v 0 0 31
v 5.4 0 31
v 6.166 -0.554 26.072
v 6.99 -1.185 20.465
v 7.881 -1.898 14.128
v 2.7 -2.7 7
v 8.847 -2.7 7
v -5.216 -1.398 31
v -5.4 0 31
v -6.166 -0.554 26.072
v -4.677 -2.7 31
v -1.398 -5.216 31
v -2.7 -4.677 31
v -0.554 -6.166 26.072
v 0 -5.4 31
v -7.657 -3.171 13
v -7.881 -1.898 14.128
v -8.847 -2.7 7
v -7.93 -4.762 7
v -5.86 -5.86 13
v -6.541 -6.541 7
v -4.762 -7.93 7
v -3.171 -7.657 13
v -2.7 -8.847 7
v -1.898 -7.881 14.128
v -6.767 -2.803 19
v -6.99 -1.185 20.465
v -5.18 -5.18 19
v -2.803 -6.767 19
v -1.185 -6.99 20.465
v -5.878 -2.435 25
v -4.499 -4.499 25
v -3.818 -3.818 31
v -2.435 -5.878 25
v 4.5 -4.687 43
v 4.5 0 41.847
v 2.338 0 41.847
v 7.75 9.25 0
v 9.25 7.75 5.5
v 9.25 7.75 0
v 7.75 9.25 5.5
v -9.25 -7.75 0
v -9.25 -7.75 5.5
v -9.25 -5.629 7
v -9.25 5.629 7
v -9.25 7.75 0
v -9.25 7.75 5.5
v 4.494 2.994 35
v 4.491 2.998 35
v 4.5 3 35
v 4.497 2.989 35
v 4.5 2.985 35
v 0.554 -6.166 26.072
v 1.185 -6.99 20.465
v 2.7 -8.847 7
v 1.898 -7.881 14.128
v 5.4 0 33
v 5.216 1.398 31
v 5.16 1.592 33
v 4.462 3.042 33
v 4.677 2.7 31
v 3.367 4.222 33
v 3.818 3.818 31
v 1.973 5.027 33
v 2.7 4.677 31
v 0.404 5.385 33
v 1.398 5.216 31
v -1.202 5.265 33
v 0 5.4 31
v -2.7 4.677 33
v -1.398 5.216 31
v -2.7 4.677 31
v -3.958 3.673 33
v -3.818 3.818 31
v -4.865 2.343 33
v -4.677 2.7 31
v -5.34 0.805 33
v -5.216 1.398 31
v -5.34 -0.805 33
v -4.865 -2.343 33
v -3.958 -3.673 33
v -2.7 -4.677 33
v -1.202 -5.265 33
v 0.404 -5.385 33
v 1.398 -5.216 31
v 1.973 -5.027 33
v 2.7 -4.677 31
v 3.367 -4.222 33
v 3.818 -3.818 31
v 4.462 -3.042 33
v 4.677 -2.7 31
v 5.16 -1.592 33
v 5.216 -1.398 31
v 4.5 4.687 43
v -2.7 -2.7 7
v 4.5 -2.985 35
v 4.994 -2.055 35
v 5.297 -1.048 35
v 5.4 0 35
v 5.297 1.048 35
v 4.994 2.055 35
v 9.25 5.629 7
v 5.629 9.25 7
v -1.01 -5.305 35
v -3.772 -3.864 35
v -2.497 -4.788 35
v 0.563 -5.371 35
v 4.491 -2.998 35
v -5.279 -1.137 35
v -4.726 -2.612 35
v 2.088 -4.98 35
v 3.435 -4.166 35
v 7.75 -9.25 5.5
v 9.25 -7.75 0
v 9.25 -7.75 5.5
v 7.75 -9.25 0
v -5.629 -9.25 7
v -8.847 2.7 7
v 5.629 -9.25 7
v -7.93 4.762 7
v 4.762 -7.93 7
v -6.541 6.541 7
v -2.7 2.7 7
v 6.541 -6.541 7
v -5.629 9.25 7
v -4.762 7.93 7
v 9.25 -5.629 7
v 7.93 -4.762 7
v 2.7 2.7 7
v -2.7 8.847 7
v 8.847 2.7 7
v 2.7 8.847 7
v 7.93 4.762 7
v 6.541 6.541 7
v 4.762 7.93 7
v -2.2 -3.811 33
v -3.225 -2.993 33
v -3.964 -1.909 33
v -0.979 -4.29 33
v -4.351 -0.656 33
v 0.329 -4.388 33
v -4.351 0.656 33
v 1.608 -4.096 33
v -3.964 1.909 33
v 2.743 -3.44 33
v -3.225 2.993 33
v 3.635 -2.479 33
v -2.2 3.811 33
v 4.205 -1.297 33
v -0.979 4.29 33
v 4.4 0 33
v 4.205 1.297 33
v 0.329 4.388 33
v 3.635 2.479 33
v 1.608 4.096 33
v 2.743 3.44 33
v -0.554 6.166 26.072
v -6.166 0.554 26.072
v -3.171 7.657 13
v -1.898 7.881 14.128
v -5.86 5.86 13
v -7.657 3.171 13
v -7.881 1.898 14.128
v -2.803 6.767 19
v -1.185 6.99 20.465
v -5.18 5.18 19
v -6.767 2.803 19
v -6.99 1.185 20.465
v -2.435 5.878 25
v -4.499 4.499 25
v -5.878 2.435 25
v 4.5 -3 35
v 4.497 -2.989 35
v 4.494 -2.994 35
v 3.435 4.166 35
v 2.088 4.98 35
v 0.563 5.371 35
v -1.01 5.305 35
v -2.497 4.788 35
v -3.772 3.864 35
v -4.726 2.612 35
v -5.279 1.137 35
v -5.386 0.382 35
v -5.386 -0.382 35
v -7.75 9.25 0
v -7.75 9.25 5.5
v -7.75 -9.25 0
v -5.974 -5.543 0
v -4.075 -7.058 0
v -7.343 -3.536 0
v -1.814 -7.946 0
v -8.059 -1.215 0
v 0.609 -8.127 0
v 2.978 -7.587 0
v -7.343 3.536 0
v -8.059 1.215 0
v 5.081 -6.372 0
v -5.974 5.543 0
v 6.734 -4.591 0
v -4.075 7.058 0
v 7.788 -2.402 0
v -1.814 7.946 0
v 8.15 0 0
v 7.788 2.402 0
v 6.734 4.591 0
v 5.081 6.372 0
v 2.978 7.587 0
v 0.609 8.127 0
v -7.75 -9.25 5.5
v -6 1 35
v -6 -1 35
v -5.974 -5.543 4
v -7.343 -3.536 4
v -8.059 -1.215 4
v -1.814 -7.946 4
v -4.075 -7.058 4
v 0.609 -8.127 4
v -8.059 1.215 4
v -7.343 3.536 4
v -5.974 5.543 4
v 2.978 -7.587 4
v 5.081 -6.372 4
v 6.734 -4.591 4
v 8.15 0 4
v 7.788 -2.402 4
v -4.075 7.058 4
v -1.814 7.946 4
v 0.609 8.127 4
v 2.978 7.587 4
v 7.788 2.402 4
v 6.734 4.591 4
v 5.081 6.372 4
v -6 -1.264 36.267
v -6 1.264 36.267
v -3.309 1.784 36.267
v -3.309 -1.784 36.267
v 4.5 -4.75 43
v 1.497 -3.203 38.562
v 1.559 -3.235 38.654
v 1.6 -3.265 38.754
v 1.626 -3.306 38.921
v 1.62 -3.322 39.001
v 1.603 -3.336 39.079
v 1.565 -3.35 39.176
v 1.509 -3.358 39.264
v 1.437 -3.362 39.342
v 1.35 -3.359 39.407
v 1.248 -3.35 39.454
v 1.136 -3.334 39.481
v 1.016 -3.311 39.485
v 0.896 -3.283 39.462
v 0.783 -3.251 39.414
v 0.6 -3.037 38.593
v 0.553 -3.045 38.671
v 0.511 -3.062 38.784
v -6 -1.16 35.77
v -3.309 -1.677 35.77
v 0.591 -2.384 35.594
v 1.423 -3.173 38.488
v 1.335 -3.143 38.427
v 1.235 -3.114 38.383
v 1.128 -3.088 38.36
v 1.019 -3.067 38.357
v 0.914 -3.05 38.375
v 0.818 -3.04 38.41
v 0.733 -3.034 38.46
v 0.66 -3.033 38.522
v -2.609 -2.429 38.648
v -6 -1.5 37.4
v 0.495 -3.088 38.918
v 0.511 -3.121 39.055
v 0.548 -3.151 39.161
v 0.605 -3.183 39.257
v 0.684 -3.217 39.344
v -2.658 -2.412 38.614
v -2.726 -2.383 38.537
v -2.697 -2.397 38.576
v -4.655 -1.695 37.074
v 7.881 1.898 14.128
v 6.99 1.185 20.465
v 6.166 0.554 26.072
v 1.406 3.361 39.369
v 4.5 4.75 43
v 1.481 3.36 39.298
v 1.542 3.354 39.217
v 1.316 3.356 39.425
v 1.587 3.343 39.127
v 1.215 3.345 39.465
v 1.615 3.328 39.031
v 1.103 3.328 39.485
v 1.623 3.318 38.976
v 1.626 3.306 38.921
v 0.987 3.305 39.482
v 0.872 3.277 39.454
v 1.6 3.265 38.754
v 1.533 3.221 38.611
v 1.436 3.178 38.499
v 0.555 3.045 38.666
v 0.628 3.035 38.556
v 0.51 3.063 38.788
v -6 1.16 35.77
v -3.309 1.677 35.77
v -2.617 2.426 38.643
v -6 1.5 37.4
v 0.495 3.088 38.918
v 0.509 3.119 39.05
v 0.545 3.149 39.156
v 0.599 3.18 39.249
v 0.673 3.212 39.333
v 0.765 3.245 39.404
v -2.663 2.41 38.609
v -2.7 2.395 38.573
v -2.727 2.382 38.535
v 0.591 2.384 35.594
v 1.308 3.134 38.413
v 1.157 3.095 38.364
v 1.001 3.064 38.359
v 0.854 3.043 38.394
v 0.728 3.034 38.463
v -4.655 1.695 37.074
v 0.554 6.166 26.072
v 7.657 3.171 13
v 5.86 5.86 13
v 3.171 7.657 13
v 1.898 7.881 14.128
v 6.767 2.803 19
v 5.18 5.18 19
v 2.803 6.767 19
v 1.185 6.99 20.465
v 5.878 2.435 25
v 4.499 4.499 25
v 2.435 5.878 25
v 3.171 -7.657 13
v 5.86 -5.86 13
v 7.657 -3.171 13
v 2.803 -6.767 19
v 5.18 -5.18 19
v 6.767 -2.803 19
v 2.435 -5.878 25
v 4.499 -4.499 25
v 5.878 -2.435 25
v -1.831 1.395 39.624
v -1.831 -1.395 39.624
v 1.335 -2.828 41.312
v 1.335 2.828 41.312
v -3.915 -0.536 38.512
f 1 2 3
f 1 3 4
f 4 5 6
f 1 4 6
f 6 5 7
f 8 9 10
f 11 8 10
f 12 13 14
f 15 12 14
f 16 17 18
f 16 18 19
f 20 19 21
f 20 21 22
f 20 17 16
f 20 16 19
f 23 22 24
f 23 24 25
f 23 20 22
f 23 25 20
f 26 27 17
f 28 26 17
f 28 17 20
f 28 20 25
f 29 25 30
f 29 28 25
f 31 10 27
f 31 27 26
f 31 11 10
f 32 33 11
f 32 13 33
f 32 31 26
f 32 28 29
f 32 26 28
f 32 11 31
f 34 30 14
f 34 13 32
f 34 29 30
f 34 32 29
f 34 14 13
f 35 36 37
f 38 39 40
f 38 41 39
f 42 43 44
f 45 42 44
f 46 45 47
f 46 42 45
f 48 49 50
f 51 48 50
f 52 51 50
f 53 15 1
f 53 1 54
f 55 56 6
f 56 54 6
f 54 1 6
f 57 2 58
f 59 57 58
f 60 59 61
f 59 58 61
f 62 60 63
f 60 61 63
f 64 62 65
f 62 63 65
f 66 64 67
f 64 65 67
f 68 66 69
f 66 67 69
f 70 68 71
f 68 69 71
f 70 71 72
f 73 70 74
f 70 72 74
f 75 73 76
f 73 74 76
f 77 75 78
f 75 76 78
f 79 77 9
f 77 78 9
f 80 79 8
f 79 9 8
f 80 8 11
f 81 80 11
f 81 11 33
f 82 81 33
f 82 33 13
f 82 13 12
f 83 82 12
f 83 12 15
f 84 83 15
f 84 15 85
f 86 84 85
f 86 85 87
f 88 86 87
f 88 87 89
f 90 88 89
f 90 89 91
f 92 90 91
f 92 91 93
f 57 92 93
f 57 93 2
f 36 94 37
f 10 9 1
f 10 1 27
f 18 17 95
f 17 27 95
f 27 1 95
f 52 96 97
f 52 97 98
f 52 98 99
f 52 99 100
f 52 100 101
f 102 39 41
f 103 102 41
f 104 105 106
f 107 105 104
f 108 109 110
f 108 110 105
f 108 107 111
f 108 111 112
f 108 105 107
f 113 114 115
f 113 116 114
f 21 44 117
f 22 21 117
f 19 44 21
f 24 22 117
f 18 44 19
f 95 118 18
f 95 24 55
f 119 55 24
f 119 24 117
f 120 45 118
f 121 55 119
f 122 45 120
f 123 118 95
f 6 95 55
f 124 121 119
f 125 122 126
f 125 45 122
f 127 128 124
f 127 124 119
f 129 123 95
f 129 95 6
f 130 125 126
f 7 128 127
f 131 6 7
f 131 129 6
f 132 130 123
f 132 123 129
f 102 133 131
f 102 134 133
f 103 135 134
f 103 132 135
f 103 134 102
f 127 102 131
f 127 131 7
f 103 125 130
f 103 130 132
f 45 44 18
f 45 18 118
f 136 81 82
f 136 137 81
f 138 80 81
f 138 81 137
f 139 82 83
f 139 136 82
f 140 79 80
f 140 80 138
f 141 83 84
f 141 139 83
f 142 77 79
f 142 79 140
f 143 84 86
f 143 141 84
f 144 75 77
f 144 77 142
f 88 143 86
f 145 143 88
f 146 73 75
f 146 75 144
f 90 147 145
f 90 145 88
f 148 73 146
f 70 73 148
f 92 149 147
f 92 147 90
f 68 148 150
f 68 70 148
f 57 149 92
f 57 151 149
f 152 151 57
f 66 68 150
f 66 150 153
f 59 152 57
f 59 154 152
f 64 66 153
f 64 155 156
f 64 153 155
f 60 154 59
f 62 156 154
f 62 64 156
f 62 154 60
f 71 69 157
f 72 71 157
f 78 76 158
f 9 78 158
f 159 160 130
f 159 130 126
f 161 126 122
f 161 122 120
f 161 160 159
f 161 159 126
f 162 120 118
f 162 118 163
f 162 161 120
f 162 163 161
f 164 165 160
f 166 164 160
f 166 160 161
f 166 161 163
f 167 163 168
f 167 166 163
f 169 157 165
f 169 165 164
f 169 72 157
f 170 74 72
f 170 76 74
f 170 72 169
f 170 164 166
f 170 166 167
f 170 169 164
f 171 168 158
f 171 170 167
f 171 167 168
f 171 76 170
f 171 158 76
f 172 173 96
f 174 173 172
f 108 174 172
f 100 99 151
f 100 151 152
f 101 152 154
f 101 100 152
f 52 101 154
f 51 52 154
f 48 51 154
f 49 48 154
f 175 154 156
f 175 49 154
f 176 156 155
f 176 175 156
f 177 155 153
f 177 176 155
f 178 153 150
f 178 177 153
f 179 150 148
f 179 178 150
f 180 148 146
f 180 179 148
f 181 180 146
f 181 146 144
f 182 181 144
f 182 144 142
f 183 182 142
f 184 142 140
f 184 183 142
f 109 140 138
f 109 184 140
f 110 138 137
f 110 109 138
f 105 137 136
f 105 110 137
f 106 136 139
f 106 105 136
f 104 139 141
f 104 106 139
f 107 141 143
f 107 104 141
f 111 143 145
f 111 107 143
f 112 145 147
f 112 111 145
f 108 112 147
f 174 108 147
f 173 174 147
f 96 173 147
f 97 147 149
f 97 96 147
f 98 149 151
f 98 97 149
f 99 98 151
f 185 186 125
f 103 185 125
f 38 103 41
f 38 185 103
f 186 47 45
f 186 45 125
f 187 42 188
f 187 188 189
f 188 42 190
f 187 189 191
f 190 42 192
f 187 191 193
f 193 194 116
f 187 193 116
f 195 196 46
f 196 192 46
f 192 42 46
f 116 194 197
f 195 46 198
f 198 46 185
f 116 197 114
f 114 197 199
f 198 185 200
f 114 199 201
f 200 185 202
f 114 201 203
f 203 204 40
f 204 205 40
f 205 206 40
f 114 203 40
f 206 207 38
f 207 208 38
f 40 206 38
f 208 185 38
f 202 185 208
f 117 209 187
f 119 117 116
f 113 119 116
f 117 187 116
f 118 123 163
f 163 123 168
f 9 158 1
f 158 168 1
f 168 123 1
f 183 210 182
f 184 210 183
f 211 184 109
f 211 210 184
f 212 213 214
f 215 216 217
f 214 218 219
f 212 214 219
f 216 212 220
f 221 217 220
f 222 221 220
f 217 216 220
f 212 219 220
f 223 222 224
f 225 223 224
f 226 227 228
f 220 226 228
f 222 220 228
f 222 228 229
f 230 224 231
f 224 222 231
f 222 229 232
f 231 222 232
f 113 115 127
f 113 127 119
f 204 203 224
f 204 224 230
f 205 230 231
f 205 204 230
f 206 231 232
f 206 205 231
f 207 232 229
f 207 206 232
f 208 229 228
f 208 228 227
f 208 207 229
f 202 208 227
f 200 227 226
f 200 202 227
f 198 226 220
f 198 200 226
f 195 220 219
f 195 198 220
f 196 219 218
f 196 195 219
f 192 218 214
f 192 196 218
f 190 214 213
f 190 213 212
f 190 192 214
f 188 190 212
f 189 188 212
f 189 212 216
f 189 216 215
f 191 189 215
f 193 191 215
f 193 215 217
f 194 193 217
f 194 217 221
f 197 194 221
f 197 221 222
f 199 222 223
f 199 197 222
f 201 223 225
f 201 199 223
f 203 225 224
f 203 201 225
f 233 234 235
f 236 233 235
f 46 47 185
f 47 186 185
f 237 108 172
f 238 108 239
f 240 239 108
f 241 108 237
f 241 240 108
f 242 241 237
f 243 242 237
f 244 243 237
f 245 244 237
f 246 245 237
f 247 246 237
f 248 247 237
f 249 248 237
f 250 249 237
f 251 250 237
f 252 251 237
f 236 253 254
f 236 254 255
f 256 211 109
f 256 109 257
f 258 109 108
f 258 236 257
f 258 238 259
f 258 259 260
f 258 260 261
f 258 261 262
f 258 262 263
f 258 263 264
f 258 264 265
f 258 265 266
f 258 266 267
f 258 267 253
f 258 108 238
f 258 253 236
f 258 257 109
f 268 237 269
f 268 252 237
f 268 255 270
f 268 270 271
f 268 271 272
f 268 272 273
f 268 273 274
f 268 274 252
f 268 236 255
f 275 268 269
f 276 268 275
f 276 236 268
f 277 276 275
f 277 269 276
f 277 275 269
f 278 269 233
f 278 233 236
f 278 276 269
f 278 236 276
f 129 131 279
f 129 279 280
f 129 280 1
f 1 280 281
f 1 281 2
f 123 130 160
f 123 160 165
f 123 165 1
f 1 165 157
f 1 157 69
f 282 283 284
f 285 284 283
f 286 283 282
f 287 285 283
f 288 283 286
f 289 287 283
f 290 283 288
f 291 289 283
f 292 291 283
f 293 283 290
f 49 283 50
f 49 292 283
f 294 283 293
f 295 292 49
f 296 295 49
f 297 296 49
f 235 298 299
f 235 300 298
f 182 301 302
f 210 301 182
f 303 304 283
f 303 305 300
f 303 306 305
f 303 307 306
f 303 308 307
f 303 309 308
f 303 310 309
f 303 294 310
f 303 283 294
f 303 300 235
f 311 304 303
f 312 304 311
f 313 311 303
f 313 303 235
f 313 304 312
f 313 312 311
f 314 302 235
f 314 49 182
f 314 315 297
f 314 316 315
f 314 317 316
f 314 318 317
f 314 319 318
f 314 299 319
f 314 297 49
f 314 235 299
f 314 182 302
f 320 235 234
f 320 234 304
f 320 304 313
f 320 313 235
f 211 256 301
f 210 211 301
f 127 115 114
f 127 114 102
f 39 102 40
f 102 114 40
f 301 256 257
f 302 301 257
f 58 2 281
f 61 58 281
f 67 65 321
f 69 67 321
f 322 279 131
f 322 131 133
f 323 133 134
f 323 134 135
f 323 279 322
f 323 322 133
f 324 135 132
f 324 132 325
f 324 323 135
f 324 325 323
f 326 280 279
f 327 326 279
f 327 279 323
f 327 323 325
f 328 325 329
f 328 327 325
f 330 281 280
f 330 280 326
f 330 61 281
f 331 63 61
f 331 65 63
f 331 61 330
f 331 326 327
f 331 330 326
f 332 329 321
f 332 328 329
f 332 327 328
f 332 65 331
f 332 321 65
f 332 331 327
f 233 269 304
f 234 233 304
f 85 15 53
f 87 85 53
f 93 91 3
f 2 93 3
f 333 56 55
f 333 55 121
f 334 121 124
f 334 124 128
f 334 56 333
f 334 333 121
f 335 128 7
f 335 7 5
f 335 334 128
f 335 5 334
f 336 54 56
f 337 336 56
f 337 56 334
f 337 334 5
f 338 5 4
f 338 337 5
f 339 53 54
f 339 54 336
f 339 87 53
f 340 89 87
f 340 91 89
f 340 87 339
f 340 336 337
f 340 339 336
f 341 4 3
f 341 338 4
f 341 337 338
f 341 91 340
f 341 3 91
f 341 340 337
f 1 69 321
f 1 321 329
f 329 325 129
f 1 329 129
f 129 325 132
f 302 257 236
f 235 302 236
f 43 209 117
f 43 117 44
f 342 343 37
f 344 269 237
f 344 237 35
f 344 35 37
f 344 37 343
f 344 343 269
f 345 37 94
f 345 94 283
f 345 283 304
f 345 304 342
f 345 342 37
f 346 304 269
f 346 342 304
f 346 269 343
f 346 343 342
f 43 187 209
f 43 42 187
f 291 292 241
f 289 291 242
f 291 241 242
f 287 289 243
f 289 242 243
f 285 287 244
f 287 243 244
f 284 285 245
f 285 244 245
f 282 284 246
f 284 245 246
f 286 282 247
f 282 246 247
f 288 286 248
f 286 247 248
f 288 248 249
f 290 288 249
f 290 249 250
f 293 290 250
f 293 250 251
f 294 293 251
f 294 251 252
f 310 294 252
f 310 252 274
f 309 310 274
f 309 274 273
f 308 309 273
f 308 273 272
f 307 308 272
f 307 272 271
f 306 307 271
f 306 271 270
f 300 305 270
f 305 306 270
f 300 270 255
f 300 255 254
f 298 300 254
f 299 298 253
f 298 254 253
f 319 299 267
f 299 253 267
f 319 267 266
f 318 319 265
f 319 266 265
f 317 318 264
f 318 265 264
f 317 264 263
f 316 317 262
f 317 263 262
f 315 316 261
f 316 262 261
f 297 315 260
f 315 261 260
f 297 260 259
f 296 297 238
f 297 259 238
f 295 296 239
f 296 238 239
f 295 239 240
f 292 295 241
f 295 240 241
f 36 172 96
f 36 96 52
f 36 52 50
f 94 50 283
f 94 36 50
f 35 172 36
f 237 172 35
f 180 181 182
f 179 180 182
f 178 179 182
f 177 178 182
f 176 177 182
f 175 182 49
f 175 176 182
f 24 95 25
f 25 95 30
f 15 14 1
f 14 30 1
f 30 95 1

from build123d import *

# Parameters (mm, degrees)
SKETCH_W           = 18.5
SKETCH_H           = 18.5
SKETCH_R           = 8.15
PAD_DEPTH          = 4
SKETCH001_W        = 18.5
SKETCH001_H        = 18.5
PAD001_DEPTH       = 3
SKETCH002_R        = 9.25
SKETCH003_R        = 5.4
SKETCH005_R        = 5.4
PAD002_DEPTH       = 2
CHAMFER_SIZE       = 1.5
CHAMFER001_SIZE    = 1.5
POCKET_DEPTH       = 102.726887
POLARPATTERN_COUNT = 4
SKETCH007_R        = 4.4
SKETCH008_R        = 5.4
SKETCH009_W        = 9
SKETCH009_H        = 1
PAD003_DEPTH       = 1
SKETCH012_R        = 0.5655
SKETCH012_W        = 3.231
SKETCH012_H        = 0.497
POCKET001_DEPTH    = 18.501
POCKET002_DEPTH    = 13.751


with BuildPart() as part:
    # Sketch → Pad (new body)
    with BuildSketch(Plane.XY):
        Rectangle(SKETCH_W, SKETCH_H)
        Circle(SKETCH_R, mode=Mode.SUBTRACT)
    extrude(amount=PAD_DEPTH)

    # Sketch001 (on Face7 of Pad) → Pad001 (join)
    with BuildSketch(Plane.XY.offset(4)):
        Rectangle(SKETCH001_W, SKETCH001_H)
    extrude(amount=PAD001_DEPTH)

    # Sketch002 (on Face10 of Pad001) → AdditiveLoft section 0
    with BuildSketch(Plane.XY.offset(7)):
        Circle(SKETCH002_R)
    # Sketch003 (on Face10 of Pad001) → AdditiveLoft section 1
    with BuildSketch(Plane.XY.offset(31)):
        Circle(SKETCH003_R)
    loft()

    # Sketch005 (on Face17 of AdditiveLoft) → Pad002 (join)
    with BuildSketch(Plane.XY.offset(31)):
        Circle(SKETCH005_R)
    extrude(amount=PAD002_DEPTH)

    # Chamfer
    chamfer_edges = [part.edges().sort_by_distance(p)[0] for p in [
        (-9.25, -9.25, 5.5),
        (-9.25, -9.25, 2),
        (9.25, -9.25, 5.5),
        (9.25, -9.25, 2),
        (9.25, 9.25, 2),
        (9.25, 9.25, 5.5),
        (-9.25, 9.25, 5.5),
        (-9.25, 9.25, 2),
    ]]
    chamfer(chamfer_edges, length=CHAMFER_SIZE)

    # Chamfer001
    chamfer001_edges = [part.edges().sort_by_distance(p)[0] for p in [
        (8.5, -8.5, 7),
        (-8.5, -8.5, 7),
        (-8.5, 8.5, 7),
        (8.5, 8.5, 7),
    ]]
    chamfer(chamfer001_edges, length=CHAMFER001_SIZE)

    # Sketch006 (on Face19 of Chamfer001) → Pocket (cut, through all)
    with BuildSketch(Plane.YZ.offset(9.25)):
        Polygon((0, 31), (-2.7, 7), (2.7, 7), align=None)
    pocket = extrude(amount=-POCKET_DEPTH, mode=Mode.SUBTRACT)

    # PolarPattern: Pocket ×4 about axis
    polarpattern_axis = Axis((0, 0, 0), (0, 0, 1))
    for i in range(1, POLARPATTERN_COUNT):
        add(pocket.rotate(polarpattern_axis, i * 360 / POLARPATTERN_COUNT), mode=Mode.SUBTRACT)

    # Sketch007 (on Face47 of PolarPattern) → AdditiveLoft001 section 0
    with BuildSketch(Plane.XY.offset(33)):
        Circle(SKETCH007_R)
    # Sketch008 → AdditiveLoft001 section 1
    with BuildSketch(Plane.XY.offset(35)):
        Circle(SKETCH008_R)
    loft()

    # Sketch009 (on Face56 of AdditiveLoft001) → Pad003 (join)
    with BuildSketch(Plane.XY.offset(35)):
        Rectangle(SKETCH009_W, SKETCH009_H)
    extrude(amount=PAD003_DEPTH)

    # Sketch010 (on Face59 of Pad003) → AdditiveLoft002 section 0
    with BuildSketch(Plane.YZ.offset(4.5)):
        Polygon((-3, 35), (-4.75, 43), (4.75, 43), (3, 35), align=None)
    # Sketch011 → AdditiveLoft002 section 1
    with BuildSketch(Plane(origin=(-6, 0, 0), x_dir=(0, -1, 0), z_dir=(-1, 0, 0))):
        Polygon((-1.5, 37.4), (1.5, 37.4), (1, 35), (-1, 35), align=None)
    loft()

    # Sketch012 (on Face43 of AdditiveLoft002) → Pocket001 (cut, through all)
    with BuildSketch(Plane.XZ.offset(9.25)):
        with Locations((1.06, 38.921)):
            Circle(SKETCH012_R)
        with Locations((-4.9245, 36.0185)):
            Rectangle(SKETCH012_W, SKETCH012_H)
    extrude(amount=-POCKET001_DEPTH, mode=Mode.SUBTRACT)

    # Sketch013 (on Face62 of Pocket001) → Pocket002 (cut, through all)
    with BuildSketch(Plane.YZ.offset(4.5)):
        Polygon((0, 44.847), (5.530097, 43.207534), (0, 41.847), (-5.530097, 43.207534), align=None)
    extrude(amount=-POCKET002_DEPTH, mode=Mode.SUBTRACT)


solid = part.part
